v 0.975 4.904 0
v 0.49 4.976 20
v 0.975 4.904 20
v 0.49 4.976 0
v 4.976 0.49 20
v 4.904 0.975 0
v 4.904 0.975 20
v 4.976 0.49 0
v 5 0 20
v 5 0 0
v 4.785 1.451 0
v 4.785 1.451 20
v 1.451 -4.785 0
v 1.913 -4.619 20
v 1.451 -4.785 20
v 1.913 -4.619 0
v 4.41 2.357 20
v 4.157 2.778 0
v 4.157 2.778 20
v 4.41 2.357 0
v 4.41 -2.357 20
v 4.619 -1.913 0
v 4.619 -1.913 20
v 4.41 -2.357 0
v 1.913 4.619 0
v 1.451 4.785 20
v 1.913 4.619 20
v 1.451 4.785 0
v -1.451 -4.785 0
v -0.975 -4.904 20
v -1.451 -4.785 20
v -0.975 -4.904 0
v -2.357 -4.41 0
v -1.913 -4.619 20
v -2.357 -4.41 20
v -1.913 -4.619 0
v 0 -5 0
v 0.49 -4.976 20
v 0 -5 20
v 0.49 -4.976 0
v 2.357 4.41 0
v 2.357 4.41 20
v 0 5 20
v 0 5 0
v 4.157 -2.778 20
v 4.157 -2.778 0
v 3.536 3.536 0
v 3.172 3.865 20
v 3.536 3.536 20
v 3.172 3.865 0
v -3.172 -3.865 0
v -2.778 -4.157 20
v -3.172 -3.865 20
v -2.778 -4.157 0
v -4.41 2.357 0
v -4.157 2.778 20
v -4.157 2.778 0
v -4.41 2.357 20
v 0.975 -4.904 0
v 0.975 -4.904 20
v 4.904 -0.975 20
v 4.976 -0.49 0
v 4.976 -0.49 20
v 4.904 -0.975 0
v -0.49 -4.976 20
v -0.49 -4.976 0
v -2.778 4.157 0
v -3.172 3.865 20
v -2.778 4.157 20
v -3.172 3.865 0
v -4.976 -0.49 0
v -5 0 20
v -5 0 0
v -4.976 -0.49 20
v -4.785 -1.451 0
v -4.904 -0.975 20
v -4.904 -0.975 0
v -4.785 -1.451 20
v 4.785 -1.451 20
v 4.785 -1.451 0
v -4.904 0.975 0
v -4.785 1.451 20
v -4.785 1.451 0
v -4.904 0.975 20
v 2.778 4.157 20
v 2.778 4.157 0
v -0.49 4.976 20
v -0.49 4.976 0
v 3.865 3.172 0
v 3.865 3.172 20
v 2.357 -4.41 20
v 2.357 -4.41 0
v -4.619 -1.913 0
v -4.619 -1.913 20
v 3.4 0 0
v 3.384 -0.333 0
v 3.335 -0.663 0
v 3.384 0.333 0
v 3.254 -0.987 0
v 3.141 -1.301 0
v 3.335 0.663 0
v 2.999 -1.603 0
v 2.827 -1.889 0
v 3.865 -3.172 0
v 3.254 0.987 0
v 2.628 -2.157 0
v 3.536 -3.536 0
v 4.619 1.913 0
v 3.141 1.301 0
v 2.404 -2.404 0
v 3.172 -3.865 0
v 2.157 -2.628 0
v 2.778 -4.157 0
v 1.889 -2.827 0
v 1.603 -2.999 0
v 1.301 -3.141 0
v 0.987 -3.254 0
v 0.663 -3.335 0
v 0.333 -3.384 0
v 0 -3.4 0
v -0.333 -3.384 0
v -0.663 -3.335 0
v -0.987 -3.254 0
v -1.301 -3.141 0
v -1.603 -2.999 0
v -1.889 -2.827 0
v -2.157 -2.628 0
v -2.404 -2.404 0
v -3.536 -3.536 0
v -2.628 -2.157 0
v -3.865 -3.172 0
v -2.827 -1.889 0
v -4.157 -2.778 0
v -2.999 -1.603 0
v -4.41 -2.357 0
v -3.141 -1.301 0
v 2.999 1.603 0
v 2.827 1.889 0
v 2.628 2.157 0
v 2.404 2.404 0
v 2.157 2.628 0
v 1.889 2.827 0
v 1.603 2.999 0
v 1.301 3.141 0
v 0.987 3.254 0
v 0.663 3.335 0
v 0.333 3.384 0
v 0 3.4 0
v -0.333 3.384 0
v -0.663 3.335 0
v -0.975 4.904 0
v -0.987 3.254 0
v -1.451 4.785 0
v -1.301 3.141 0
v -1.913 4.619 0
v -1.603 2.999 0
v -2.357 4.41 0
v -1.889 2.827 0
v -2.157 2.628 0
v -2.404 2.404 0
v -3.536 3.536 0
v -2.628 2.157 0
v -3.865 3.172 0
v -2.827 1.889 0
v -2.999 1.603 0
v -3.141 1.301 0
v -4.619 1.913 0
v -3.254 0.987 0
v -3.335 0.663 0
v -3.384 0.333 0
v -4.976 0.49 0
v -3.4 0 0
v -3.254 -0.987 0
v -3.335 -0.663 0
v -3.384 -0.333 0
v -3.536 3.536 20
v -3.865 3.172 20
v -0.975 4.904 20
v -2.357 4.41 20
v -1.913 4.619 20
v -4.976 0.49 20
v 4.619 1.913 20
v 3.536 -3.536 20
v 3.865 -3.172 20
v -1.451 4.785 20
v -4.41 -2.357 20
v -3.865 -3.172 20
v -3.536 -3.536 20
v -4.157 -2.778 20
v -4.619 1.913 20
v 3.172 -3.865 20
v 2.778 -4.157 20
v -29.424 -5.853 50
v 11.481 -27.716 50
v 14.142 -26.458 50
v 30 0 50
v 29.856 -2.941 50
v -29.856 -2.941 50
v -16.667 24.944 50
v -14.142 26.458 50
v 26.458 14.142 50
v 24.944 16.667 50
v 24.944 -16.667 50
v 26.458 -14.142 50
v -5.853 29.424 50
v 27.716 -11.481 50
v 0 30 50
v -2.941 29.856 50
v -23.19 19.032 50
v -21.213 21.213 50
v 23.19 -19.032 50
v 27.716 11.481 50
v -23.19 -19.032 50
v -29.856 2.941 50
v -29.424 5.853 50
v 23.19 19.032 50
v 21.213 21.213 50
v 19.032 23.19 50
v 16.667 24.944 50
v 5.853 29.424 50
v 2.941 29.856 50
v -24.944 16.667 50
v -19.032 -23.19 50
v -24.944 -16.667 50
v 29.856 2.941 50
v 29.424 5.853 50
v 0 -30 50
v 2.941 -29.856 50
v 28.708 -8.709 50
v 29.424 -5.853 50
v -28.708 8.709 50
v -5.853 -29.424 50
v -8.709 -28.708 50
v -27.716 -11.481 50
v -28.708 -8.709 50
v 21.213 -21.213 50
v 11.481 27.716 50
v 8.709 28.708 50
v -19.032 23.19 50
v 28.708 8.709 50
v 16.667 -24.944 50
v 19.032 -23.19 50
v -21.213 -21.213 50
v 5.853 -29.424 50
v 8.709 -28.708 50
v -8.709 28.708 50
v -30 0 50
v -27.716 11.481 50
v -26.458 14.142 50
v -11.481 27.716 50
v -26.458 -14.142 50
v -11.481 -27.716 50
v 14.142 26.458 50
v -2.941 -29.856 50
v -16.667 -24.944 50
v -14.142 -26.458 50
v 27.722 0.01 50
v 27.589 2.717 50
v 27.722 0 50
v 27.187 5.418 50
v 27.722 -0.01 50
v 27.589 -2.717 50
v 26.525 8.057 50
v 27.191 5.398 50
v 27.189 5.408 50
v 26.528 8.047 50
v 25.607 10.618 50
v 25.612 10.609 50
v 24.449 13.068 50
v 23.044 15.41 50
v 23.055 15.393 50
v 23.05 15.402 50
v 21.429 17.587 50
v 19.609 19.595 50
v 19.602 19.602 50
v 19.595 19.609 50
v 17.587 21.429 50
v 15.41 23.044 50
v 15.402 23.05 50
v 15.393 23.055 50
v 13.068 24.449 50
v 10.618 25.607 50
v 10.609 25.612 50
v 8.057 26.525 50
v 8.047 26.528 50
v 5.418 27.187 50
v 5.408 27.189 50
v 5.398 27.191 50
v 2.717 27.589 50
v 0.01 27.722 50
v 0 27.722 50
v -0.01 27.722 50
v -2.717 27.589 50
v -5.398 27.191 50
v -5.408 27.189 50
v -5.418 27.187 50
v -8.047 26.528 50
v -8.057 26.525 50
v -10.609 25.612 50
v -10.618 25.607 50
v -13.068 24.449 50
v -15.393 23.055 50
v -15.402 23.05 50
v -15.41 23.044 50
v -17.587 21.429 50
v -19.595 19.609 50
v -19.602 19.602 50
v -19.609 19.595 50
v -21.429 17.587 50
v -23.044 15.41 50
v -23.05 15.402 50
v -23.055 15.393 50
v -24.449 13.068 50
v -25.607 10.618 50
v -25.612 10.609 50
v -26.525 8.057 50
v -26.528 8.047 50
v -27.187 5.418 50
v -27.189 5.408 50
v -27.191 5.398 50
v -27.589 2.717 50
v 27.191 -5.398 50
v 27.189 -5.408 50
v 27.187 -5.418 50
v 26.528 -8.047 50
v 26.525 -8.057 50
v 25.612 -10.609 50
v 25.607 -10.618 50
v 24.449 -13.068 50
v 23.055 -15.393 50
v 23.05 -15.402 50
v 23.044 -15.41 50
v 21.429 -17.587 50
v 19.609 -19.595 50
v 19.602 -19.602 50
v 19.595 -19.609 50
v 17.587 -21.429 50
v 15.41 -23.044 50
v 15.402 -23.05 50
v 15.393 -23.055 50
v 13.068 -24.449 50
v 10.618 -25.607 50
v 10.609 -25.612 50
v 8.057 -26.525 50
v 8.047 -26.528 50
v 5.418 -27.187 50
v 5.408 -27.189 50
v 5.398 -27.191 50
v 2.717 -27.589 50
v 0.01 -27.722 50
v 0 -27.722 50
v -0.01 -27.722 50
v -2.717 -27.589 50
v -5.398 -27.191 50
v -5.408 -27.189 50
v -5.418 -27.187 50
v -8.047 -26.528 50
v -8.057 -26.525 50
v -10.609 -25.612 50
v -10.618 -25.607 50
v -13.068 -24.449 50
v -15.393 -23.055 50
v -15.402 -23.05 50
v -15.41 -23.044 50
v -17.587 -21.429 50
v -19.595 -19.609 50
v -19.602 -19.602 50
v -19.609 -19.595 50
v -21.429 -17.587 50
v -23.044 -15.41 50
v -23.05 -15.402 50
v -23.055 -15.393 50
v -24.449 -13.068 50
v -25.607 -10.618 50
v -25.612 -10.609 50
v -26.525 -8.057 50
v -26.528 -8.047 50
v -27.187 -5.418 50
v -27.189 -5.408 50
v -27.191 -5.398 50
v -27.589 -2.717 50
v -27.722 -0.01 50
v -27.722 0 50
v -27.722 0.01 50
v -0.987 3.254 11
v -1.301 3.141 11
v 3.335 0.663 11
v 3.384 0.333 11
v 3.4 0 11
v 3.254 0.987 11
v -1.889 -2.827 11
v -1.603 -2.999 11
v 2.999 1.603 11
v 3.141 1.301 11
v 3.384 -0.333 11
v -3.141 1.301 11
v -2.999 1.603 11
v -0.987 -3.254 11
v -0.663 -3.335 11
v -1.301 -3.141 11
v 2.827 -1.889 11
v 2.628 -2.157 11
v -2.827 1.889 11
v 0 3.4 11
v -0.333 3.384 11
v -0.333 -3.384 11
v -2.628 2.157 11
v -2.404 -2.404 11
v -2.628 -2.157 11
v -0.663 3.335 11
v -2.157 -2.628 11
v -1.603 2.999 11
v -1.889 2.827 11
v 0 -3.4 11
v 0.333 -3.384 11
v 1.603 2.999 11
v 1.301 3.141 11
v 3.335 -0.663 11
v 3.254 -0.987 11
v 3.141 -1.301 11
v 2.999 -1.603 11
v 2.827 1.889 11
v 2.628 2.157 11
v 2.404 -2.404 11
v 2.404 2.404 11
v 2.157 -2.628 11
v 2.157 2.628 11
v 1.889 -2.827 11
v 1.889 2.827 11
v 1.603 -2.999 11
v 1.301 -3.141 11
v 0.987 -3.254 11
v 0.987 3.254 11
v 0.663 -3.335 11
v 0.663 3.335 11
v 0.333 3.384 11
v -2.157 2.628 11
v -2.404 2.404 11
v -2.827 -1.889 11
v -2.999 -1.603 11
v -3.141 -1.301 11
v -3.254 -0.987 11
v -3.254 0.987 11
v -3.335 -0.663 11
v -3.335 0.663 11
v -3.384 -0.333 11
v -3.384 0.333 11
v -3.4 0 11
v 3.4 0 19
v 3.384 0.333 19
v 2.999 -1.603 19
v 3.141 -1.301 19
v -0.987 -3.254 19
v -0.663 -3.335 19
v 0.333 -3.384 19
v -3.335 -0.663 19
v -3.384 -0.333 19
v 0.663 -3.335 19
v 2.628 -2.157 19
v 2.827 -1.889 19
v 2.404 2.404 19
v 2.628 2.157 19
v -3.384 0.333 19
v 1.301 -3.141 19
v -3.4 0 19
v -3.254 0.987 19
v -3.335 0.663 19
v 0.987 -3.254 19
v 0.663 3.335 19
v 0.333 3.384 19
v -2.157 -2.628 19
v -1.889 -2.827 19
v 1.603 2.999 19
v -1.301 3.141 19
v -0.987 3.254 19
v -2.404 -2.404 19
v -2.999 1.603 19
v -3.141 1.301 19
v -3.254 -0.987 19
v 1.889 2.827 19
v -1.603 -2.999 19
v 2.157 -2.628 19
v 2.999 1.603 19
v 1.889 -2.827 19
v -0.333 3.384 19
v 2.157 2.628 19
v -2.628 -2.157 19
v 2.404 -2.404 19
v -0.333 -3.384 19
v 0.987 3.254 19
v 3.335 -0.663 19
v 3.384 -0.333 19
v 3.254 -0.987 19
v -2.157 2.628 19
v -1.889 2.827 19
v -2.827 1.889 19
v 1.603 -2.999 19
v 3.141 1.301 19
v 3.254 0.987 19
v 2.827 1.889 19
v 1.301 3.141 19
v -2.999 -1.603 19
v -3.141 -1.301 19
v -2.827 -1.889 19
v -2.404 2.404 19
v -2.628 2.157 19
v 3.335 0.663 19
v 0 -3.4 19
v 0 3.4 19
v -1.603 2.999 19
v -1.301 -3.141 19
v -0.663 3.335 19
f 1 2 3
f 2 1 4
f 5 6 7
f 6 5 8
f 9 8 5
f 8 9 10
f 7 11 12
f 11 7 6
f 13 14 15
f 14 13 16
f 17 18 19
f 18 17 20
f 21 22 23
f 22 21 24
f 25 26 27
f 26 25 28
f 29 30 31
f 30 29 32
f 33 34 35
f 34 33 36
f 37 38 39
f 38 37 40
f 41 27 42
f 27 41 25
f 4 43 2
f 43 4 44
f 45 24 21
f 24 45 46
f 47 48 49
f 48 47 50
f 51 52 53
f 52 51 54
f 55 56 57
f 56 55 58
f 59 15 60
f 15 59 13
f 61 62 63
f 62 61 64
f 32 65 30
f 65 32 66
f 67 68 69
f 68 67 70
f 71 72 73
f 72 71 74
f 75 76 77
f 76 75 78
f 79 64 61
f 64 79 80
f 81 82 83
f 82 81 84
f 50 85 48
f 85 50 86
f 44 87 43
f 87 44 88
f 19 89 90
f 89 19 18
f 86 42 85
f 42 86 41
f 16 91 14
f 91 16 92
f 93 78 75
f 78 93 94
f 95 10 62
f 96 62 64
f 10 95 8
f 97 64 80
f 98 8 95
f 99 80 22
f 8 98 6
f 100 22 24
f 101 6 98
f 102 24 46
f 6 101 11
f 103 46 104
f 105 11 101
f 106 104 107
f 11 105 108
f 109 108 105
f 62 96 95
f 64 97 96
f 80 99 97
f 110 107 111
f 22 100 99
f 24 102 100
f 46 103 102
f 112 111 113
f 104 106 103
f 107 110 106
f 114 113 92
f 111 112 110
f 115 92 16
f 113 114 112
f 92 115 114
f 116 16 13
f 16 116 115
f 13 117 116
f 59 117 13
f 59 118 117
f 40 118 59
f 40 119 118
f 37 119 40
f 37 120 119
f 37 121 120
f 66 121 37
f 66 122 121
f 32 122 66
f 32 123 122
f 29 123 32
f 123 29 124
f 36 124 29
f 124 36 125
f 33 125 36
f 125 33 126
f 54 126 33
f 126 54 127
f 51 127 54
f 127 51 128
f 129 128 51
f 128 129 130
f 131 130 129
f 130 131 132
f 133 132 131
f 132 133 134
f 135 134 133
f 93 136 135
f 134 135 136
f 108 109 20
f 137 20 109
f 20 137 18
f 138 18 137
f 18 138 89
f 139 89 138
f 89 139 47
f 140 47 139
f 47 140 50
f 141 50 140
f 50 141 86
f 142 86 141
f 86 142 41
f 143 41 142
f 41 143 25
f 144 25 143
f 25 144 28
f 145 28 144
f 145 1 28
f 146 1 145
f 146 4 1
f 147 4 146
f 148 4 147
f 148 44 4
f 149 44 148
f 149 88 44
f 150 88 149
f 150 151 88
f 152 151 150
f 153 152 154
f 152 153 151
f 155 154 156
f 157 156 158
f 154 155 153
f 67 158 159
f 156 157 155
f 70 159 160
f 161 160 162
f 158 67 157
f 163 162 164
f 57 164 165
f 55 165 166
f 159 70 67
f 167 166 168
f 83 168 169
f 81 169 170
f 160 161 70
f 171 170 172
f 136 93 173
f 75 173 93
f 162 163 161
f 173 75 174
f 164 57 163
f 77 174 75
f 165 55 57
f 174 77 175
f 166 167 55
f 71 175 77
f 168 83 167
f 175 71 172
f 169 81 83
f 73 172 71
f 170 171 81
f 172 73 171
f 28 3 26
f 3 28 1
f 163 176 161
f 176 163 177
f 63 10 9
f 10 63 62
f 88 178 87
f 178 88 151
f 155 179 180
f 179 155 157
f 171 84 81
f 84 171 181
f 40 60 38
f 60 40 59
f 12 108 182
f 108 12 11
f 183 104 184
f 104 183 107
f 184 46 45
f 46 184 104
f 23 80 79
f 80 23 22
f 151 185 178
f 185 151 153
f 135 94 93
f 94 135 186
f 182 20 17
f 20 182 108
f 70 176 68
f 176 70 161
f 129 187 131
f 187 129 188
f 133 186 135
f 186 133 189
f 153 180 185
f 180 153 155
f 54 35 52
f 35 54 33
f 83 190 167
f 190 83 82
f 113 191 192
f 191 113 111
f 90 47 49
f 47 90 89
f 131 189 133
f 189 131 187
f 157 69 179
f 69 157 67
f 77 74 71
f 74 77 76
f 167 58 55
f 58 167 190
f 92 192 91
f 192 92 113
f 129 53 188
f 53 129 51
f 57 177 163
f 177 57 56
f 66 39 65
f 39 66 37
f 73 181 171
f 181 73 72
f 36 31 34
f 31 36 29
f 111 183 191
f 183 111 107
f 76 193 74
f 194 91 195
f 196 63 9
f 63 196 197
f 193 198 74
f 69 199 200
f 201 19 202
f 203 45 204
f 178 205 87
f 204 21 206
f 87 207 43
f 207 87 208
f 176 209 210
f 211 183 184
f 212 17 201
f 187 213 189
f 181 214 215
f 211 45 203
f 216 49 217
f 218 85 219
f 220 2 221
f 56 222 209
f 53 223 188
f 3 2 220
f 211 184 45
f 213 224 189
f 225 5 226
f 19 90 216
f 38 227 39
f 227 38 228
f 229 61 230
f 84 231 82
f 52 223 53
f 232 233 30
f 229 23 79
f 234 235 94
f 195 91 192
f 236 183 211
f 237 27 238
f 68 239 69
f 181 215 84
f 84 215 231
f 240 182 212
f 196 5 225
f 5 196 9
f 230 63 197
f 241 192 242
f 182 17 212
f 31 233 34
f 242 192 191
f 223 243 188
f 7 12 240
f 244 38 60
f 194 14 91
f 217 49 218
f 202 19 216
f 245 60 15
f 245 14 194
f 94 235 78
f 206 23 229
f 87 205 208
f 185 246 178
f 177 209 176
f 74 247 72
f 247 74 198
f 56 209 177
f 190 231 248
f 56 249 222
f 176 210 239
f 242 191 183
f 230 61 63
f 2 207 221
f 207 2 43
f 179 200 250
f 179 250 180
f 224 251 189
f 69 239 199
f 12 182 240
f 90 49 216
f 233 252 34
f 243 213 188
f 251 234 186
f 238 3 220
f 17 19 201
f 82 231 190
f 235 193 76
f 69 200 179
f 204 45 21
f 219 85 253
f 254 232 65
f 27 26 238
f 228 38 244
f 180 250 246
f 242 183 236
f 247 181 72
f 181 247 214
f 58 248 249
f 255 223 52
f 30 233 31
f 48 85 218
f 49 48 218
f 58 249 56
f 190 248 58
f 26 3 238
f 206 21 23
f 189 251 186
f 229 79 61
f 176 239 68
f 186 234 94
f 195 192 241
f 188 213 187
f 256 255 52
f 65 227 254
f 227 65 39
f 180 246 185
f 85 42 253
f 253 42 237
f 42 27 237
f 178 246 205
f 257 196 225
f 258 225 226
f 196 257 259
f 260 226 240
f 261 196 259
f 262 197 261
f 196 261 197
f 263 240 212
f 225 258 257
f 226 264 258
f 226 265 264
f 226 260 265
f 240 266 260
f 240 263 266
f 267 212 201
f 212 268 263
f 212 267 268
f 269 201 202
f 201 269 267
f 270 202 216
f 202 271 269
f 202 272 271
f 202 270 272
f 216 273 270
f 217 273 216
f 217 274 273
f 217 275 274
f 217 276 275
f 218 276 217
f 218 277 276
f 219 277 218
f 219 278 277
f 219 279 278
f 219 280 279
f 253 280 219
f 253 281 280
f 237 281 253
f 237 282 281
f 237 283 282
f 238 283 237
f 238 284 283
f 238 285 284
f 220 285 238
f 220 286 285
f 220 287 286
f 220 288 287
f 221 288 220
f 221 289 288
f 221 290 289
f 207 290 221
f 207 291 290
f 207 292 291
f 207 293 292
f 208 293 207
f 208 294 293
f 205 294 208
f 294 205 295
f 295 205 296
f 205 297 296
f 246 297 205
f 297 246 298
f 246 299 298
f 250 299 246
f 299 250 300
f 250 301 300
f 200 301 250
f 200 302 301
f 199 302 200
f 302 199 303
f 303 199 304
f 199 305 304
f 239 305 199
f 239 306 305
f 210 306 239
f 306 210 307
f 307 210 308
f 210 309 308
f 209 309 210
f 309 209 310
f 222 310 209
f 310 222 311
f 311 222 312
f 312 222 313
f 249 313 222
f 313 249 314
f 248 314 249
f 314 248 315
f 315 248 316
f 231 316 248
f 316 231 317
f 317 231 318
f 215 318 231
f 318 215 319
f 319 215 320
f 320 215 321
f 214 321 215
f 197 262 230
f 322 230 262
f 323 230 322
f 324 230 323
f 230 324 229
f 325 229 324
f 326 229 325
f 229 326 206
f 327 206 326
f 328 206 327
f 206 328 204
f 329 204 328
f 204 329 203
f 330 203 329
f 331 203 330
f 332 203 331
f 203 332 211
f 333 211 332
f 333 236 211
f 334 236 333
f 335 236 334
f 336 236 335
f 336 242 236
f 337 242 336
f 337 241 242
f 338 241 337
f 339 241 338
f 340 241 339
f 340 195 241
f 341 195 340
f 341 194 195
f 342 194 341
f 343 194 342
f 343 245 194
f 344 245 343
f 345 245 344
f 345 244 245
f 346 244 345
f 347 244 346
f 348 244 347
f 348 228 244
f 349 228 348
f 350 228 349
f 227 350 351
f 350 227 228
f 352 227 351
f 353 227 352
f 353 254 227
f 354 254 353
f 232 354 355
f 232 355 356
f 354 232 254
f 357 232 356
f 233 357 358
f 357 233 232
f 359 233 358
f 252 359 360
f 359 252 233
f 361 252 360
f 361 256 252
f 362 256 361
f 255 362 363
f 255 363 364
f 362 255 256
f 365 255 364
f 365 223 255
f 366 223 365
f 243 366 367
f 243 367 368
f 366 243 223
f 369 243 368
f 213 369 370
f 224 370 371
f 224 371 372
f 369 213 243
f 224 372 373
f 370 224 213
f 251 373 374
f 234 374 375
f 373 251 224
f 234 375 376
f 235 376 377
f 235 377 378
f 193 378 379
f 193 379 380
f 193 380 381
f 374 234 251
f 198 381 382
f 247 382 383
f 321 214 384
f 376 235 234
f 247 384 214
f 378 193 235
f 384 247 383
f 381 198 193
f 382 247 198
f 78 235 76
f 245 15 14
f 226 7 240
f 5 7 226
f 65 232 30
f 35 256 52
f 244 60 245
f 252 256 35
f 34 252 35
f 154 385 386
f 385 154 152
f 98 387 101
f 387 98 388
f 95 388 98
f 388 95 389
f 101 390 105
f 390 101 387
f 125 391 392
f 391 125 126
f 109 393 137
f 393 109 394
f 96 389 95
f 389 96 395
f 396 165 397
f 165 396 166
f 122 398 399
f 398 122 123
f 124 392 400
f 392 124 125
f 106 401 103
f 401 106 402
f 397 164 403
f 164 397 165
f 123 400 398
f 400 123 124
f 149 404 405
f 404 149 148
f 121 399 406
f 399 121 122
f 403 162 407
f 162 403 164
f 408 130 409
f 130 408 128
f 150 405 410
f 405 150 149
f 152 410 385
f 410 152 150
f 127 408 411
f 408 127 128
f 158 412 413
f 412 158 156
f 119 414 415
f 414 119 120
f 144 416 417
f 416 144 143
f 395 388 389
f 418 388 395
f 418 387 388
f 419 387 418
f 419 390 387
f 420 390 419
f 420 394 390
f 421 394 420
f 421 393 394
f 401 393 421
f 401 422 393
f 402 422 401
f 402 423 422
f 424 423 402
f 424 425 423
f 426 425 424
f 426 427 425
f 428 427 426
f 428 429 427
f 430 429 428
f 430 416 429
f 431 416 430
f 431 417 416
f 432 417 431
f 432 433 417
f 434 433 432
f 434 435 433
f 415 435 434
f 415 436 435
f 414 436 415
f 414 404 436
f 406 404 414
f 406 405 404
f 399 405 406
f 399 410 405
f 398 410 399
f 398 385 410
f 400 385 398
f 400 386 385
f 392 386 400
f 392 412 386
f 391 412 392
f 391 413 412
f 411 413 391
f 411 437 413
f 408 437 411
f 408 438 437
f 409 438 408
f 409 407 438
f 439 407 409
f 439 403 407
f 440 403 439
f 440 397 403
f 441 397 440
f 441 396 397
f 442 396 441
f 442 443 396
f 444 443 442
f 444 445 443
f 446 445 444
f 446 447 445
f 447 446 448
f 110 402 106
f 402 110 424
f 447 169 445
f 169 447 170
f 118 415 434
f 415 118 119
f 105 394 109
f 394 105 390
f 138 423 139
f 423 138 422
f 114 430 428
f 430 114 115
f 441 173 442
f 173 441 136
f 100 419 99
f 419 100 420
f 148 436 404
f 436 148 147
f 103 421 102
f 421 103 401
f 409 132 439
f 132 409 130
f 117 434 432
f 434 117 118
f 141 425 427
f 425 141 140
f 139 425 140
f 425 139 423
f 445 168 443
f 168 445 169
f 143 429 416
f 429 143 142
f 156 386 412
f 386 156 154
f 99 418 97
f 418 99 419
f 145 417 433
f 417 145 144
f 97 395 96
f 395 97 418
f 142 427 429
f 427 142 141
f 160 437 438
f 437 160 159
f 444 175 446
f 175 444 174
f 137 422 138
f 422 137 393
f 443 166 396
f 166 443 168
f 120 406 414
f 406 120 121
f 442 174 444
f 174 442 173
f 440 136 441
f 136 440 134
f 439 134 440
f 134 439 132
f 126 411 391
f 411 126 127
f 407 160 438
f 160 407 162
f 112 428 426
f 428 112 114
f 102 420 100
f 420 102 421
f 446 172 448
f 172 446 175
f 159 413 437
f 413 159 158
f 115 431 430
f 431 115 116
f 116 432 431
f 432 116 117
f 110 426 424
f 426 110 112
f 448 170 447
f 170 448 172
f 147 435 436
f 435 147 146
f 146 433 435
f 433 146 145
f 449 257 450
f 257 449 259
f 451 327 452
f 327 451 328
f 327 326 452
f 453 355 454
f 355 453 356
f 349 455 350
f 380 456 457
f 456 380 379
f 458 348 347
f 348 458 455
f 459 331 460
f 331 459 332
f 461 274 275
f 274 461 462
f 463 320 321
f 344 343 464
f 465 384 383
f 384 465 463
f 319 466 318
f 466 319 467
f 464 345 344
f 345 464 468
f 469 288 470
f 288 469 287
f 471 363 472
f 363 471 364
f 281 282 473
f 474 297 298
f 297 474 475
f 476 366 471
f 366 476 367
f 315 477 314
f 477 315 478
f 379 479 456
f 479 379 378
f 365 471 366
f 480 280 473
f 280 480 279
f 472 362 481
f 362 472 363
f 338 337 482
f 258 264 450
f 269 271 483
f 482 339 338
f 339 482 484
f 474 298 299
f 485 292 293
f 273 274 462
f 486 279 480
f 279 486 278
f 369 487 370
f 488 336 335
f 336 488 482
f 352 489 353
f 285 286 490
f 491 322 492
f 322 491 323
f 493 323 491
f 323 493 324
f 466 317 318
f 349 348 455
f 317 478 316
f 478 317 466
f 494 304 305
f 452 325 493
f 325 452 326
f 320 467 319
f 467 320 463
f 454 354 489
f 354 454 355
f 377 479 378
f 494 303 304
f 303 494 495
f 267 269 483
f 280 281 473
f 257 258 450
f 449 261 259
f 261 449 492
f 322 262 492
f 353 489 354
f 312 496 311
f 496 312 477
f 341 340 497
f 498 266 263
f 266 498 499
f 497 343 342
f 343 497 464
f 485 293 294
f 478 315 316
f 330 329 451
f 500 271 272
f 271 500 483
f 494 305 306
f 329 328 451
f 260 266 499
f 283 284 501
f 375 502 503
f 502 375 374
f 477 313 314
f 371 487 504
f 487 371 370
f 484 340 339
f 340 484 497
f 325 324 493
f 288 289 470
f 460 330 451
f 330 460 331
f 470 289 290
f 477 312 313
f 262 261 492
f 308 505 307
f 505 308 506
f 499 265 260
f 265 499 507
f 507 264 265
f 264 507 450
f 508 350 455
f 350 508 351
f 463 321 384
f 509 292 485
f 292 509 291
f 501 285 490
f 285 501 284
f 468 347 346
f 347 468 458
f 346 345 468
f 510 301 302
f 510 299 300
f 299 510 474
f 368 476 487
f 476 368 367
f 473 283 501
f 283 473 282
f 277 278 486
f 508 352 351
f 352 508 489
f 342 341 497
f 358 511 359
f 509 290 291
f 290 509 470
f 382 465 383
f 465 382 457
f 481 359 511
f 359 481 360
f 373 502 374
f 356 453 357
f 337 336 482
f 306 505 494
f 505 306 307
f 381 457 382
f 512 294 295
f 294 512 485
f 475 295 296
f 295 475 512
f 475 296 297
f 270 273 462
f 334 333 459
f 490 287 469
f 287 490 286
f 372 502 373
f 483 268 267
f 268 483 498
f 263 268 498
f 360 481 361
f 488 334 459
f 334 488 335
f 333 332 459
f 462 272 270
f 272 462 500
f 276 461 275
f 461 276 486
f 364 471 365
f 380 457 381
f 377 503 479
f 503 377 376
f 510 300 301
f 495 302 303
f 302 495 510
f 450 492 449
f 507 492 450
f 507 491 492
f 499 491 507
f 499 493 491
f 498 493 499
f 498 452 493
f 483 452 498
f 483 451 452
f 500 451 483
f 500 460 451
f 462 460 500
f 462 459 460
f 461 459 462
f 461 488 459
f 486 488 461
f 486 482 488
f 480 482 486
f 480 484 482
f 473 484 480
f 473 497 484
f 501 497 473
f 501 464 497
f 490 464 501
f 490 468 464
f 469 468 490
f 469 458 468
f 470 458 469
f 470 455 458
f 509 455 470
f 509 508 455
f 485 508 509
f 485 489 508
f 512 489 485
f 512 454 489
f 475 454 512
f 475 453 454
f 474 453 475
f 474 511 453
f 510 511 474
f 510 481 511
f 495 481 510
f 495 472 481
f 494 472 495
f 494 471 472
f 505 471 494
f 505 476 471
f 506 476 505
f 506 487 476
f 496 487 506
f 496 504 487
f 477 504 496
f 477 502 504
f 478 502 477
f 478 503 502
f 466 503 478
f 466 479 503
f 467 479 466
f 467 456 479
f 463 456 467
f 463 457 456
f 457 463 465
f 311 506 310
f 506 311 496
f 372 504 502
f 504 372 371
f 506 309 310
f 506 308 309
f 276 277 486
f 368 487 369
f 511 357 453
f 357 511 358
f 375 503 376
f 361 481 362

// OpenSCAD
// Small lab funnel, printed upright (wide opening at top).
// All dimensions in mm.

// ---- Named dimensions (measured with calipers) ----
spout_od   = 10;   // spout outer diameter
spout_id   = 6.8;  // spout bore (inner diameter)
spout_h    = 20;   // spout height (z = 0 to z = 20)
cone_od    = 60;   // cone outer diameter at rim (z = 50)
cone_id    = 56.8; // cone inner diameter at rim (cone_od - 2*wall)
cone_h     = 30;   // cone height (z = 20 to z = 50)
wall       = 1.6;  // uniform wall thickness

// ---- Curvature resolution ----
$fn = 64;

// ---- Build the funnel as a single solid, then hollow it ----
// Outer profile: straight spout cylinder + widening cone on top.
// Inner profile: straight bore through the spout + conical bore through the cone.
// The difference leaves a 1.6 mm wall everywhere and open top/bottom.

difference() {
    // Outer solid
    union() {
        // Spout: straight tube, z = 0 to z = 20
        cylinder(h = spout_h, d = spout_od, $fn = $fn);

        // Cone: widens from spout_od at z = 20 to cone_od at z = 50
        translate([0, 0, spout_h])
            cylinder(h = cone_h, d1 = spout_od, d2 = cone_od, $fn = $fn);
    }

    // Inner bore (cutting shape extends 1 mm past both open faces)
    union() {
        // Spout bore: straight, z = -1 to z = 21
        cylinder(h = spout_h + 2, d = spout_id, $fn = $fn,
                 center = true, origin = [0, 0, spout_h / 2]);

        // Cone bore: conical, z = 19 to z = 51
        // At z = 19 (1 mm below the spout/cone junction) the inner cone
        // diameter equals spout_id, so it blends smoothly into the spout bore.
        // At z = 51 (1 mm past the rim) it is slightly larger than cone_id.
        translate([0, 0, 19])
            cylinder(h = 32, d1 = spout_id, d2 = cone_id + 2 * wall * (2 / cone_h), $fn = $fn);
    }
}
